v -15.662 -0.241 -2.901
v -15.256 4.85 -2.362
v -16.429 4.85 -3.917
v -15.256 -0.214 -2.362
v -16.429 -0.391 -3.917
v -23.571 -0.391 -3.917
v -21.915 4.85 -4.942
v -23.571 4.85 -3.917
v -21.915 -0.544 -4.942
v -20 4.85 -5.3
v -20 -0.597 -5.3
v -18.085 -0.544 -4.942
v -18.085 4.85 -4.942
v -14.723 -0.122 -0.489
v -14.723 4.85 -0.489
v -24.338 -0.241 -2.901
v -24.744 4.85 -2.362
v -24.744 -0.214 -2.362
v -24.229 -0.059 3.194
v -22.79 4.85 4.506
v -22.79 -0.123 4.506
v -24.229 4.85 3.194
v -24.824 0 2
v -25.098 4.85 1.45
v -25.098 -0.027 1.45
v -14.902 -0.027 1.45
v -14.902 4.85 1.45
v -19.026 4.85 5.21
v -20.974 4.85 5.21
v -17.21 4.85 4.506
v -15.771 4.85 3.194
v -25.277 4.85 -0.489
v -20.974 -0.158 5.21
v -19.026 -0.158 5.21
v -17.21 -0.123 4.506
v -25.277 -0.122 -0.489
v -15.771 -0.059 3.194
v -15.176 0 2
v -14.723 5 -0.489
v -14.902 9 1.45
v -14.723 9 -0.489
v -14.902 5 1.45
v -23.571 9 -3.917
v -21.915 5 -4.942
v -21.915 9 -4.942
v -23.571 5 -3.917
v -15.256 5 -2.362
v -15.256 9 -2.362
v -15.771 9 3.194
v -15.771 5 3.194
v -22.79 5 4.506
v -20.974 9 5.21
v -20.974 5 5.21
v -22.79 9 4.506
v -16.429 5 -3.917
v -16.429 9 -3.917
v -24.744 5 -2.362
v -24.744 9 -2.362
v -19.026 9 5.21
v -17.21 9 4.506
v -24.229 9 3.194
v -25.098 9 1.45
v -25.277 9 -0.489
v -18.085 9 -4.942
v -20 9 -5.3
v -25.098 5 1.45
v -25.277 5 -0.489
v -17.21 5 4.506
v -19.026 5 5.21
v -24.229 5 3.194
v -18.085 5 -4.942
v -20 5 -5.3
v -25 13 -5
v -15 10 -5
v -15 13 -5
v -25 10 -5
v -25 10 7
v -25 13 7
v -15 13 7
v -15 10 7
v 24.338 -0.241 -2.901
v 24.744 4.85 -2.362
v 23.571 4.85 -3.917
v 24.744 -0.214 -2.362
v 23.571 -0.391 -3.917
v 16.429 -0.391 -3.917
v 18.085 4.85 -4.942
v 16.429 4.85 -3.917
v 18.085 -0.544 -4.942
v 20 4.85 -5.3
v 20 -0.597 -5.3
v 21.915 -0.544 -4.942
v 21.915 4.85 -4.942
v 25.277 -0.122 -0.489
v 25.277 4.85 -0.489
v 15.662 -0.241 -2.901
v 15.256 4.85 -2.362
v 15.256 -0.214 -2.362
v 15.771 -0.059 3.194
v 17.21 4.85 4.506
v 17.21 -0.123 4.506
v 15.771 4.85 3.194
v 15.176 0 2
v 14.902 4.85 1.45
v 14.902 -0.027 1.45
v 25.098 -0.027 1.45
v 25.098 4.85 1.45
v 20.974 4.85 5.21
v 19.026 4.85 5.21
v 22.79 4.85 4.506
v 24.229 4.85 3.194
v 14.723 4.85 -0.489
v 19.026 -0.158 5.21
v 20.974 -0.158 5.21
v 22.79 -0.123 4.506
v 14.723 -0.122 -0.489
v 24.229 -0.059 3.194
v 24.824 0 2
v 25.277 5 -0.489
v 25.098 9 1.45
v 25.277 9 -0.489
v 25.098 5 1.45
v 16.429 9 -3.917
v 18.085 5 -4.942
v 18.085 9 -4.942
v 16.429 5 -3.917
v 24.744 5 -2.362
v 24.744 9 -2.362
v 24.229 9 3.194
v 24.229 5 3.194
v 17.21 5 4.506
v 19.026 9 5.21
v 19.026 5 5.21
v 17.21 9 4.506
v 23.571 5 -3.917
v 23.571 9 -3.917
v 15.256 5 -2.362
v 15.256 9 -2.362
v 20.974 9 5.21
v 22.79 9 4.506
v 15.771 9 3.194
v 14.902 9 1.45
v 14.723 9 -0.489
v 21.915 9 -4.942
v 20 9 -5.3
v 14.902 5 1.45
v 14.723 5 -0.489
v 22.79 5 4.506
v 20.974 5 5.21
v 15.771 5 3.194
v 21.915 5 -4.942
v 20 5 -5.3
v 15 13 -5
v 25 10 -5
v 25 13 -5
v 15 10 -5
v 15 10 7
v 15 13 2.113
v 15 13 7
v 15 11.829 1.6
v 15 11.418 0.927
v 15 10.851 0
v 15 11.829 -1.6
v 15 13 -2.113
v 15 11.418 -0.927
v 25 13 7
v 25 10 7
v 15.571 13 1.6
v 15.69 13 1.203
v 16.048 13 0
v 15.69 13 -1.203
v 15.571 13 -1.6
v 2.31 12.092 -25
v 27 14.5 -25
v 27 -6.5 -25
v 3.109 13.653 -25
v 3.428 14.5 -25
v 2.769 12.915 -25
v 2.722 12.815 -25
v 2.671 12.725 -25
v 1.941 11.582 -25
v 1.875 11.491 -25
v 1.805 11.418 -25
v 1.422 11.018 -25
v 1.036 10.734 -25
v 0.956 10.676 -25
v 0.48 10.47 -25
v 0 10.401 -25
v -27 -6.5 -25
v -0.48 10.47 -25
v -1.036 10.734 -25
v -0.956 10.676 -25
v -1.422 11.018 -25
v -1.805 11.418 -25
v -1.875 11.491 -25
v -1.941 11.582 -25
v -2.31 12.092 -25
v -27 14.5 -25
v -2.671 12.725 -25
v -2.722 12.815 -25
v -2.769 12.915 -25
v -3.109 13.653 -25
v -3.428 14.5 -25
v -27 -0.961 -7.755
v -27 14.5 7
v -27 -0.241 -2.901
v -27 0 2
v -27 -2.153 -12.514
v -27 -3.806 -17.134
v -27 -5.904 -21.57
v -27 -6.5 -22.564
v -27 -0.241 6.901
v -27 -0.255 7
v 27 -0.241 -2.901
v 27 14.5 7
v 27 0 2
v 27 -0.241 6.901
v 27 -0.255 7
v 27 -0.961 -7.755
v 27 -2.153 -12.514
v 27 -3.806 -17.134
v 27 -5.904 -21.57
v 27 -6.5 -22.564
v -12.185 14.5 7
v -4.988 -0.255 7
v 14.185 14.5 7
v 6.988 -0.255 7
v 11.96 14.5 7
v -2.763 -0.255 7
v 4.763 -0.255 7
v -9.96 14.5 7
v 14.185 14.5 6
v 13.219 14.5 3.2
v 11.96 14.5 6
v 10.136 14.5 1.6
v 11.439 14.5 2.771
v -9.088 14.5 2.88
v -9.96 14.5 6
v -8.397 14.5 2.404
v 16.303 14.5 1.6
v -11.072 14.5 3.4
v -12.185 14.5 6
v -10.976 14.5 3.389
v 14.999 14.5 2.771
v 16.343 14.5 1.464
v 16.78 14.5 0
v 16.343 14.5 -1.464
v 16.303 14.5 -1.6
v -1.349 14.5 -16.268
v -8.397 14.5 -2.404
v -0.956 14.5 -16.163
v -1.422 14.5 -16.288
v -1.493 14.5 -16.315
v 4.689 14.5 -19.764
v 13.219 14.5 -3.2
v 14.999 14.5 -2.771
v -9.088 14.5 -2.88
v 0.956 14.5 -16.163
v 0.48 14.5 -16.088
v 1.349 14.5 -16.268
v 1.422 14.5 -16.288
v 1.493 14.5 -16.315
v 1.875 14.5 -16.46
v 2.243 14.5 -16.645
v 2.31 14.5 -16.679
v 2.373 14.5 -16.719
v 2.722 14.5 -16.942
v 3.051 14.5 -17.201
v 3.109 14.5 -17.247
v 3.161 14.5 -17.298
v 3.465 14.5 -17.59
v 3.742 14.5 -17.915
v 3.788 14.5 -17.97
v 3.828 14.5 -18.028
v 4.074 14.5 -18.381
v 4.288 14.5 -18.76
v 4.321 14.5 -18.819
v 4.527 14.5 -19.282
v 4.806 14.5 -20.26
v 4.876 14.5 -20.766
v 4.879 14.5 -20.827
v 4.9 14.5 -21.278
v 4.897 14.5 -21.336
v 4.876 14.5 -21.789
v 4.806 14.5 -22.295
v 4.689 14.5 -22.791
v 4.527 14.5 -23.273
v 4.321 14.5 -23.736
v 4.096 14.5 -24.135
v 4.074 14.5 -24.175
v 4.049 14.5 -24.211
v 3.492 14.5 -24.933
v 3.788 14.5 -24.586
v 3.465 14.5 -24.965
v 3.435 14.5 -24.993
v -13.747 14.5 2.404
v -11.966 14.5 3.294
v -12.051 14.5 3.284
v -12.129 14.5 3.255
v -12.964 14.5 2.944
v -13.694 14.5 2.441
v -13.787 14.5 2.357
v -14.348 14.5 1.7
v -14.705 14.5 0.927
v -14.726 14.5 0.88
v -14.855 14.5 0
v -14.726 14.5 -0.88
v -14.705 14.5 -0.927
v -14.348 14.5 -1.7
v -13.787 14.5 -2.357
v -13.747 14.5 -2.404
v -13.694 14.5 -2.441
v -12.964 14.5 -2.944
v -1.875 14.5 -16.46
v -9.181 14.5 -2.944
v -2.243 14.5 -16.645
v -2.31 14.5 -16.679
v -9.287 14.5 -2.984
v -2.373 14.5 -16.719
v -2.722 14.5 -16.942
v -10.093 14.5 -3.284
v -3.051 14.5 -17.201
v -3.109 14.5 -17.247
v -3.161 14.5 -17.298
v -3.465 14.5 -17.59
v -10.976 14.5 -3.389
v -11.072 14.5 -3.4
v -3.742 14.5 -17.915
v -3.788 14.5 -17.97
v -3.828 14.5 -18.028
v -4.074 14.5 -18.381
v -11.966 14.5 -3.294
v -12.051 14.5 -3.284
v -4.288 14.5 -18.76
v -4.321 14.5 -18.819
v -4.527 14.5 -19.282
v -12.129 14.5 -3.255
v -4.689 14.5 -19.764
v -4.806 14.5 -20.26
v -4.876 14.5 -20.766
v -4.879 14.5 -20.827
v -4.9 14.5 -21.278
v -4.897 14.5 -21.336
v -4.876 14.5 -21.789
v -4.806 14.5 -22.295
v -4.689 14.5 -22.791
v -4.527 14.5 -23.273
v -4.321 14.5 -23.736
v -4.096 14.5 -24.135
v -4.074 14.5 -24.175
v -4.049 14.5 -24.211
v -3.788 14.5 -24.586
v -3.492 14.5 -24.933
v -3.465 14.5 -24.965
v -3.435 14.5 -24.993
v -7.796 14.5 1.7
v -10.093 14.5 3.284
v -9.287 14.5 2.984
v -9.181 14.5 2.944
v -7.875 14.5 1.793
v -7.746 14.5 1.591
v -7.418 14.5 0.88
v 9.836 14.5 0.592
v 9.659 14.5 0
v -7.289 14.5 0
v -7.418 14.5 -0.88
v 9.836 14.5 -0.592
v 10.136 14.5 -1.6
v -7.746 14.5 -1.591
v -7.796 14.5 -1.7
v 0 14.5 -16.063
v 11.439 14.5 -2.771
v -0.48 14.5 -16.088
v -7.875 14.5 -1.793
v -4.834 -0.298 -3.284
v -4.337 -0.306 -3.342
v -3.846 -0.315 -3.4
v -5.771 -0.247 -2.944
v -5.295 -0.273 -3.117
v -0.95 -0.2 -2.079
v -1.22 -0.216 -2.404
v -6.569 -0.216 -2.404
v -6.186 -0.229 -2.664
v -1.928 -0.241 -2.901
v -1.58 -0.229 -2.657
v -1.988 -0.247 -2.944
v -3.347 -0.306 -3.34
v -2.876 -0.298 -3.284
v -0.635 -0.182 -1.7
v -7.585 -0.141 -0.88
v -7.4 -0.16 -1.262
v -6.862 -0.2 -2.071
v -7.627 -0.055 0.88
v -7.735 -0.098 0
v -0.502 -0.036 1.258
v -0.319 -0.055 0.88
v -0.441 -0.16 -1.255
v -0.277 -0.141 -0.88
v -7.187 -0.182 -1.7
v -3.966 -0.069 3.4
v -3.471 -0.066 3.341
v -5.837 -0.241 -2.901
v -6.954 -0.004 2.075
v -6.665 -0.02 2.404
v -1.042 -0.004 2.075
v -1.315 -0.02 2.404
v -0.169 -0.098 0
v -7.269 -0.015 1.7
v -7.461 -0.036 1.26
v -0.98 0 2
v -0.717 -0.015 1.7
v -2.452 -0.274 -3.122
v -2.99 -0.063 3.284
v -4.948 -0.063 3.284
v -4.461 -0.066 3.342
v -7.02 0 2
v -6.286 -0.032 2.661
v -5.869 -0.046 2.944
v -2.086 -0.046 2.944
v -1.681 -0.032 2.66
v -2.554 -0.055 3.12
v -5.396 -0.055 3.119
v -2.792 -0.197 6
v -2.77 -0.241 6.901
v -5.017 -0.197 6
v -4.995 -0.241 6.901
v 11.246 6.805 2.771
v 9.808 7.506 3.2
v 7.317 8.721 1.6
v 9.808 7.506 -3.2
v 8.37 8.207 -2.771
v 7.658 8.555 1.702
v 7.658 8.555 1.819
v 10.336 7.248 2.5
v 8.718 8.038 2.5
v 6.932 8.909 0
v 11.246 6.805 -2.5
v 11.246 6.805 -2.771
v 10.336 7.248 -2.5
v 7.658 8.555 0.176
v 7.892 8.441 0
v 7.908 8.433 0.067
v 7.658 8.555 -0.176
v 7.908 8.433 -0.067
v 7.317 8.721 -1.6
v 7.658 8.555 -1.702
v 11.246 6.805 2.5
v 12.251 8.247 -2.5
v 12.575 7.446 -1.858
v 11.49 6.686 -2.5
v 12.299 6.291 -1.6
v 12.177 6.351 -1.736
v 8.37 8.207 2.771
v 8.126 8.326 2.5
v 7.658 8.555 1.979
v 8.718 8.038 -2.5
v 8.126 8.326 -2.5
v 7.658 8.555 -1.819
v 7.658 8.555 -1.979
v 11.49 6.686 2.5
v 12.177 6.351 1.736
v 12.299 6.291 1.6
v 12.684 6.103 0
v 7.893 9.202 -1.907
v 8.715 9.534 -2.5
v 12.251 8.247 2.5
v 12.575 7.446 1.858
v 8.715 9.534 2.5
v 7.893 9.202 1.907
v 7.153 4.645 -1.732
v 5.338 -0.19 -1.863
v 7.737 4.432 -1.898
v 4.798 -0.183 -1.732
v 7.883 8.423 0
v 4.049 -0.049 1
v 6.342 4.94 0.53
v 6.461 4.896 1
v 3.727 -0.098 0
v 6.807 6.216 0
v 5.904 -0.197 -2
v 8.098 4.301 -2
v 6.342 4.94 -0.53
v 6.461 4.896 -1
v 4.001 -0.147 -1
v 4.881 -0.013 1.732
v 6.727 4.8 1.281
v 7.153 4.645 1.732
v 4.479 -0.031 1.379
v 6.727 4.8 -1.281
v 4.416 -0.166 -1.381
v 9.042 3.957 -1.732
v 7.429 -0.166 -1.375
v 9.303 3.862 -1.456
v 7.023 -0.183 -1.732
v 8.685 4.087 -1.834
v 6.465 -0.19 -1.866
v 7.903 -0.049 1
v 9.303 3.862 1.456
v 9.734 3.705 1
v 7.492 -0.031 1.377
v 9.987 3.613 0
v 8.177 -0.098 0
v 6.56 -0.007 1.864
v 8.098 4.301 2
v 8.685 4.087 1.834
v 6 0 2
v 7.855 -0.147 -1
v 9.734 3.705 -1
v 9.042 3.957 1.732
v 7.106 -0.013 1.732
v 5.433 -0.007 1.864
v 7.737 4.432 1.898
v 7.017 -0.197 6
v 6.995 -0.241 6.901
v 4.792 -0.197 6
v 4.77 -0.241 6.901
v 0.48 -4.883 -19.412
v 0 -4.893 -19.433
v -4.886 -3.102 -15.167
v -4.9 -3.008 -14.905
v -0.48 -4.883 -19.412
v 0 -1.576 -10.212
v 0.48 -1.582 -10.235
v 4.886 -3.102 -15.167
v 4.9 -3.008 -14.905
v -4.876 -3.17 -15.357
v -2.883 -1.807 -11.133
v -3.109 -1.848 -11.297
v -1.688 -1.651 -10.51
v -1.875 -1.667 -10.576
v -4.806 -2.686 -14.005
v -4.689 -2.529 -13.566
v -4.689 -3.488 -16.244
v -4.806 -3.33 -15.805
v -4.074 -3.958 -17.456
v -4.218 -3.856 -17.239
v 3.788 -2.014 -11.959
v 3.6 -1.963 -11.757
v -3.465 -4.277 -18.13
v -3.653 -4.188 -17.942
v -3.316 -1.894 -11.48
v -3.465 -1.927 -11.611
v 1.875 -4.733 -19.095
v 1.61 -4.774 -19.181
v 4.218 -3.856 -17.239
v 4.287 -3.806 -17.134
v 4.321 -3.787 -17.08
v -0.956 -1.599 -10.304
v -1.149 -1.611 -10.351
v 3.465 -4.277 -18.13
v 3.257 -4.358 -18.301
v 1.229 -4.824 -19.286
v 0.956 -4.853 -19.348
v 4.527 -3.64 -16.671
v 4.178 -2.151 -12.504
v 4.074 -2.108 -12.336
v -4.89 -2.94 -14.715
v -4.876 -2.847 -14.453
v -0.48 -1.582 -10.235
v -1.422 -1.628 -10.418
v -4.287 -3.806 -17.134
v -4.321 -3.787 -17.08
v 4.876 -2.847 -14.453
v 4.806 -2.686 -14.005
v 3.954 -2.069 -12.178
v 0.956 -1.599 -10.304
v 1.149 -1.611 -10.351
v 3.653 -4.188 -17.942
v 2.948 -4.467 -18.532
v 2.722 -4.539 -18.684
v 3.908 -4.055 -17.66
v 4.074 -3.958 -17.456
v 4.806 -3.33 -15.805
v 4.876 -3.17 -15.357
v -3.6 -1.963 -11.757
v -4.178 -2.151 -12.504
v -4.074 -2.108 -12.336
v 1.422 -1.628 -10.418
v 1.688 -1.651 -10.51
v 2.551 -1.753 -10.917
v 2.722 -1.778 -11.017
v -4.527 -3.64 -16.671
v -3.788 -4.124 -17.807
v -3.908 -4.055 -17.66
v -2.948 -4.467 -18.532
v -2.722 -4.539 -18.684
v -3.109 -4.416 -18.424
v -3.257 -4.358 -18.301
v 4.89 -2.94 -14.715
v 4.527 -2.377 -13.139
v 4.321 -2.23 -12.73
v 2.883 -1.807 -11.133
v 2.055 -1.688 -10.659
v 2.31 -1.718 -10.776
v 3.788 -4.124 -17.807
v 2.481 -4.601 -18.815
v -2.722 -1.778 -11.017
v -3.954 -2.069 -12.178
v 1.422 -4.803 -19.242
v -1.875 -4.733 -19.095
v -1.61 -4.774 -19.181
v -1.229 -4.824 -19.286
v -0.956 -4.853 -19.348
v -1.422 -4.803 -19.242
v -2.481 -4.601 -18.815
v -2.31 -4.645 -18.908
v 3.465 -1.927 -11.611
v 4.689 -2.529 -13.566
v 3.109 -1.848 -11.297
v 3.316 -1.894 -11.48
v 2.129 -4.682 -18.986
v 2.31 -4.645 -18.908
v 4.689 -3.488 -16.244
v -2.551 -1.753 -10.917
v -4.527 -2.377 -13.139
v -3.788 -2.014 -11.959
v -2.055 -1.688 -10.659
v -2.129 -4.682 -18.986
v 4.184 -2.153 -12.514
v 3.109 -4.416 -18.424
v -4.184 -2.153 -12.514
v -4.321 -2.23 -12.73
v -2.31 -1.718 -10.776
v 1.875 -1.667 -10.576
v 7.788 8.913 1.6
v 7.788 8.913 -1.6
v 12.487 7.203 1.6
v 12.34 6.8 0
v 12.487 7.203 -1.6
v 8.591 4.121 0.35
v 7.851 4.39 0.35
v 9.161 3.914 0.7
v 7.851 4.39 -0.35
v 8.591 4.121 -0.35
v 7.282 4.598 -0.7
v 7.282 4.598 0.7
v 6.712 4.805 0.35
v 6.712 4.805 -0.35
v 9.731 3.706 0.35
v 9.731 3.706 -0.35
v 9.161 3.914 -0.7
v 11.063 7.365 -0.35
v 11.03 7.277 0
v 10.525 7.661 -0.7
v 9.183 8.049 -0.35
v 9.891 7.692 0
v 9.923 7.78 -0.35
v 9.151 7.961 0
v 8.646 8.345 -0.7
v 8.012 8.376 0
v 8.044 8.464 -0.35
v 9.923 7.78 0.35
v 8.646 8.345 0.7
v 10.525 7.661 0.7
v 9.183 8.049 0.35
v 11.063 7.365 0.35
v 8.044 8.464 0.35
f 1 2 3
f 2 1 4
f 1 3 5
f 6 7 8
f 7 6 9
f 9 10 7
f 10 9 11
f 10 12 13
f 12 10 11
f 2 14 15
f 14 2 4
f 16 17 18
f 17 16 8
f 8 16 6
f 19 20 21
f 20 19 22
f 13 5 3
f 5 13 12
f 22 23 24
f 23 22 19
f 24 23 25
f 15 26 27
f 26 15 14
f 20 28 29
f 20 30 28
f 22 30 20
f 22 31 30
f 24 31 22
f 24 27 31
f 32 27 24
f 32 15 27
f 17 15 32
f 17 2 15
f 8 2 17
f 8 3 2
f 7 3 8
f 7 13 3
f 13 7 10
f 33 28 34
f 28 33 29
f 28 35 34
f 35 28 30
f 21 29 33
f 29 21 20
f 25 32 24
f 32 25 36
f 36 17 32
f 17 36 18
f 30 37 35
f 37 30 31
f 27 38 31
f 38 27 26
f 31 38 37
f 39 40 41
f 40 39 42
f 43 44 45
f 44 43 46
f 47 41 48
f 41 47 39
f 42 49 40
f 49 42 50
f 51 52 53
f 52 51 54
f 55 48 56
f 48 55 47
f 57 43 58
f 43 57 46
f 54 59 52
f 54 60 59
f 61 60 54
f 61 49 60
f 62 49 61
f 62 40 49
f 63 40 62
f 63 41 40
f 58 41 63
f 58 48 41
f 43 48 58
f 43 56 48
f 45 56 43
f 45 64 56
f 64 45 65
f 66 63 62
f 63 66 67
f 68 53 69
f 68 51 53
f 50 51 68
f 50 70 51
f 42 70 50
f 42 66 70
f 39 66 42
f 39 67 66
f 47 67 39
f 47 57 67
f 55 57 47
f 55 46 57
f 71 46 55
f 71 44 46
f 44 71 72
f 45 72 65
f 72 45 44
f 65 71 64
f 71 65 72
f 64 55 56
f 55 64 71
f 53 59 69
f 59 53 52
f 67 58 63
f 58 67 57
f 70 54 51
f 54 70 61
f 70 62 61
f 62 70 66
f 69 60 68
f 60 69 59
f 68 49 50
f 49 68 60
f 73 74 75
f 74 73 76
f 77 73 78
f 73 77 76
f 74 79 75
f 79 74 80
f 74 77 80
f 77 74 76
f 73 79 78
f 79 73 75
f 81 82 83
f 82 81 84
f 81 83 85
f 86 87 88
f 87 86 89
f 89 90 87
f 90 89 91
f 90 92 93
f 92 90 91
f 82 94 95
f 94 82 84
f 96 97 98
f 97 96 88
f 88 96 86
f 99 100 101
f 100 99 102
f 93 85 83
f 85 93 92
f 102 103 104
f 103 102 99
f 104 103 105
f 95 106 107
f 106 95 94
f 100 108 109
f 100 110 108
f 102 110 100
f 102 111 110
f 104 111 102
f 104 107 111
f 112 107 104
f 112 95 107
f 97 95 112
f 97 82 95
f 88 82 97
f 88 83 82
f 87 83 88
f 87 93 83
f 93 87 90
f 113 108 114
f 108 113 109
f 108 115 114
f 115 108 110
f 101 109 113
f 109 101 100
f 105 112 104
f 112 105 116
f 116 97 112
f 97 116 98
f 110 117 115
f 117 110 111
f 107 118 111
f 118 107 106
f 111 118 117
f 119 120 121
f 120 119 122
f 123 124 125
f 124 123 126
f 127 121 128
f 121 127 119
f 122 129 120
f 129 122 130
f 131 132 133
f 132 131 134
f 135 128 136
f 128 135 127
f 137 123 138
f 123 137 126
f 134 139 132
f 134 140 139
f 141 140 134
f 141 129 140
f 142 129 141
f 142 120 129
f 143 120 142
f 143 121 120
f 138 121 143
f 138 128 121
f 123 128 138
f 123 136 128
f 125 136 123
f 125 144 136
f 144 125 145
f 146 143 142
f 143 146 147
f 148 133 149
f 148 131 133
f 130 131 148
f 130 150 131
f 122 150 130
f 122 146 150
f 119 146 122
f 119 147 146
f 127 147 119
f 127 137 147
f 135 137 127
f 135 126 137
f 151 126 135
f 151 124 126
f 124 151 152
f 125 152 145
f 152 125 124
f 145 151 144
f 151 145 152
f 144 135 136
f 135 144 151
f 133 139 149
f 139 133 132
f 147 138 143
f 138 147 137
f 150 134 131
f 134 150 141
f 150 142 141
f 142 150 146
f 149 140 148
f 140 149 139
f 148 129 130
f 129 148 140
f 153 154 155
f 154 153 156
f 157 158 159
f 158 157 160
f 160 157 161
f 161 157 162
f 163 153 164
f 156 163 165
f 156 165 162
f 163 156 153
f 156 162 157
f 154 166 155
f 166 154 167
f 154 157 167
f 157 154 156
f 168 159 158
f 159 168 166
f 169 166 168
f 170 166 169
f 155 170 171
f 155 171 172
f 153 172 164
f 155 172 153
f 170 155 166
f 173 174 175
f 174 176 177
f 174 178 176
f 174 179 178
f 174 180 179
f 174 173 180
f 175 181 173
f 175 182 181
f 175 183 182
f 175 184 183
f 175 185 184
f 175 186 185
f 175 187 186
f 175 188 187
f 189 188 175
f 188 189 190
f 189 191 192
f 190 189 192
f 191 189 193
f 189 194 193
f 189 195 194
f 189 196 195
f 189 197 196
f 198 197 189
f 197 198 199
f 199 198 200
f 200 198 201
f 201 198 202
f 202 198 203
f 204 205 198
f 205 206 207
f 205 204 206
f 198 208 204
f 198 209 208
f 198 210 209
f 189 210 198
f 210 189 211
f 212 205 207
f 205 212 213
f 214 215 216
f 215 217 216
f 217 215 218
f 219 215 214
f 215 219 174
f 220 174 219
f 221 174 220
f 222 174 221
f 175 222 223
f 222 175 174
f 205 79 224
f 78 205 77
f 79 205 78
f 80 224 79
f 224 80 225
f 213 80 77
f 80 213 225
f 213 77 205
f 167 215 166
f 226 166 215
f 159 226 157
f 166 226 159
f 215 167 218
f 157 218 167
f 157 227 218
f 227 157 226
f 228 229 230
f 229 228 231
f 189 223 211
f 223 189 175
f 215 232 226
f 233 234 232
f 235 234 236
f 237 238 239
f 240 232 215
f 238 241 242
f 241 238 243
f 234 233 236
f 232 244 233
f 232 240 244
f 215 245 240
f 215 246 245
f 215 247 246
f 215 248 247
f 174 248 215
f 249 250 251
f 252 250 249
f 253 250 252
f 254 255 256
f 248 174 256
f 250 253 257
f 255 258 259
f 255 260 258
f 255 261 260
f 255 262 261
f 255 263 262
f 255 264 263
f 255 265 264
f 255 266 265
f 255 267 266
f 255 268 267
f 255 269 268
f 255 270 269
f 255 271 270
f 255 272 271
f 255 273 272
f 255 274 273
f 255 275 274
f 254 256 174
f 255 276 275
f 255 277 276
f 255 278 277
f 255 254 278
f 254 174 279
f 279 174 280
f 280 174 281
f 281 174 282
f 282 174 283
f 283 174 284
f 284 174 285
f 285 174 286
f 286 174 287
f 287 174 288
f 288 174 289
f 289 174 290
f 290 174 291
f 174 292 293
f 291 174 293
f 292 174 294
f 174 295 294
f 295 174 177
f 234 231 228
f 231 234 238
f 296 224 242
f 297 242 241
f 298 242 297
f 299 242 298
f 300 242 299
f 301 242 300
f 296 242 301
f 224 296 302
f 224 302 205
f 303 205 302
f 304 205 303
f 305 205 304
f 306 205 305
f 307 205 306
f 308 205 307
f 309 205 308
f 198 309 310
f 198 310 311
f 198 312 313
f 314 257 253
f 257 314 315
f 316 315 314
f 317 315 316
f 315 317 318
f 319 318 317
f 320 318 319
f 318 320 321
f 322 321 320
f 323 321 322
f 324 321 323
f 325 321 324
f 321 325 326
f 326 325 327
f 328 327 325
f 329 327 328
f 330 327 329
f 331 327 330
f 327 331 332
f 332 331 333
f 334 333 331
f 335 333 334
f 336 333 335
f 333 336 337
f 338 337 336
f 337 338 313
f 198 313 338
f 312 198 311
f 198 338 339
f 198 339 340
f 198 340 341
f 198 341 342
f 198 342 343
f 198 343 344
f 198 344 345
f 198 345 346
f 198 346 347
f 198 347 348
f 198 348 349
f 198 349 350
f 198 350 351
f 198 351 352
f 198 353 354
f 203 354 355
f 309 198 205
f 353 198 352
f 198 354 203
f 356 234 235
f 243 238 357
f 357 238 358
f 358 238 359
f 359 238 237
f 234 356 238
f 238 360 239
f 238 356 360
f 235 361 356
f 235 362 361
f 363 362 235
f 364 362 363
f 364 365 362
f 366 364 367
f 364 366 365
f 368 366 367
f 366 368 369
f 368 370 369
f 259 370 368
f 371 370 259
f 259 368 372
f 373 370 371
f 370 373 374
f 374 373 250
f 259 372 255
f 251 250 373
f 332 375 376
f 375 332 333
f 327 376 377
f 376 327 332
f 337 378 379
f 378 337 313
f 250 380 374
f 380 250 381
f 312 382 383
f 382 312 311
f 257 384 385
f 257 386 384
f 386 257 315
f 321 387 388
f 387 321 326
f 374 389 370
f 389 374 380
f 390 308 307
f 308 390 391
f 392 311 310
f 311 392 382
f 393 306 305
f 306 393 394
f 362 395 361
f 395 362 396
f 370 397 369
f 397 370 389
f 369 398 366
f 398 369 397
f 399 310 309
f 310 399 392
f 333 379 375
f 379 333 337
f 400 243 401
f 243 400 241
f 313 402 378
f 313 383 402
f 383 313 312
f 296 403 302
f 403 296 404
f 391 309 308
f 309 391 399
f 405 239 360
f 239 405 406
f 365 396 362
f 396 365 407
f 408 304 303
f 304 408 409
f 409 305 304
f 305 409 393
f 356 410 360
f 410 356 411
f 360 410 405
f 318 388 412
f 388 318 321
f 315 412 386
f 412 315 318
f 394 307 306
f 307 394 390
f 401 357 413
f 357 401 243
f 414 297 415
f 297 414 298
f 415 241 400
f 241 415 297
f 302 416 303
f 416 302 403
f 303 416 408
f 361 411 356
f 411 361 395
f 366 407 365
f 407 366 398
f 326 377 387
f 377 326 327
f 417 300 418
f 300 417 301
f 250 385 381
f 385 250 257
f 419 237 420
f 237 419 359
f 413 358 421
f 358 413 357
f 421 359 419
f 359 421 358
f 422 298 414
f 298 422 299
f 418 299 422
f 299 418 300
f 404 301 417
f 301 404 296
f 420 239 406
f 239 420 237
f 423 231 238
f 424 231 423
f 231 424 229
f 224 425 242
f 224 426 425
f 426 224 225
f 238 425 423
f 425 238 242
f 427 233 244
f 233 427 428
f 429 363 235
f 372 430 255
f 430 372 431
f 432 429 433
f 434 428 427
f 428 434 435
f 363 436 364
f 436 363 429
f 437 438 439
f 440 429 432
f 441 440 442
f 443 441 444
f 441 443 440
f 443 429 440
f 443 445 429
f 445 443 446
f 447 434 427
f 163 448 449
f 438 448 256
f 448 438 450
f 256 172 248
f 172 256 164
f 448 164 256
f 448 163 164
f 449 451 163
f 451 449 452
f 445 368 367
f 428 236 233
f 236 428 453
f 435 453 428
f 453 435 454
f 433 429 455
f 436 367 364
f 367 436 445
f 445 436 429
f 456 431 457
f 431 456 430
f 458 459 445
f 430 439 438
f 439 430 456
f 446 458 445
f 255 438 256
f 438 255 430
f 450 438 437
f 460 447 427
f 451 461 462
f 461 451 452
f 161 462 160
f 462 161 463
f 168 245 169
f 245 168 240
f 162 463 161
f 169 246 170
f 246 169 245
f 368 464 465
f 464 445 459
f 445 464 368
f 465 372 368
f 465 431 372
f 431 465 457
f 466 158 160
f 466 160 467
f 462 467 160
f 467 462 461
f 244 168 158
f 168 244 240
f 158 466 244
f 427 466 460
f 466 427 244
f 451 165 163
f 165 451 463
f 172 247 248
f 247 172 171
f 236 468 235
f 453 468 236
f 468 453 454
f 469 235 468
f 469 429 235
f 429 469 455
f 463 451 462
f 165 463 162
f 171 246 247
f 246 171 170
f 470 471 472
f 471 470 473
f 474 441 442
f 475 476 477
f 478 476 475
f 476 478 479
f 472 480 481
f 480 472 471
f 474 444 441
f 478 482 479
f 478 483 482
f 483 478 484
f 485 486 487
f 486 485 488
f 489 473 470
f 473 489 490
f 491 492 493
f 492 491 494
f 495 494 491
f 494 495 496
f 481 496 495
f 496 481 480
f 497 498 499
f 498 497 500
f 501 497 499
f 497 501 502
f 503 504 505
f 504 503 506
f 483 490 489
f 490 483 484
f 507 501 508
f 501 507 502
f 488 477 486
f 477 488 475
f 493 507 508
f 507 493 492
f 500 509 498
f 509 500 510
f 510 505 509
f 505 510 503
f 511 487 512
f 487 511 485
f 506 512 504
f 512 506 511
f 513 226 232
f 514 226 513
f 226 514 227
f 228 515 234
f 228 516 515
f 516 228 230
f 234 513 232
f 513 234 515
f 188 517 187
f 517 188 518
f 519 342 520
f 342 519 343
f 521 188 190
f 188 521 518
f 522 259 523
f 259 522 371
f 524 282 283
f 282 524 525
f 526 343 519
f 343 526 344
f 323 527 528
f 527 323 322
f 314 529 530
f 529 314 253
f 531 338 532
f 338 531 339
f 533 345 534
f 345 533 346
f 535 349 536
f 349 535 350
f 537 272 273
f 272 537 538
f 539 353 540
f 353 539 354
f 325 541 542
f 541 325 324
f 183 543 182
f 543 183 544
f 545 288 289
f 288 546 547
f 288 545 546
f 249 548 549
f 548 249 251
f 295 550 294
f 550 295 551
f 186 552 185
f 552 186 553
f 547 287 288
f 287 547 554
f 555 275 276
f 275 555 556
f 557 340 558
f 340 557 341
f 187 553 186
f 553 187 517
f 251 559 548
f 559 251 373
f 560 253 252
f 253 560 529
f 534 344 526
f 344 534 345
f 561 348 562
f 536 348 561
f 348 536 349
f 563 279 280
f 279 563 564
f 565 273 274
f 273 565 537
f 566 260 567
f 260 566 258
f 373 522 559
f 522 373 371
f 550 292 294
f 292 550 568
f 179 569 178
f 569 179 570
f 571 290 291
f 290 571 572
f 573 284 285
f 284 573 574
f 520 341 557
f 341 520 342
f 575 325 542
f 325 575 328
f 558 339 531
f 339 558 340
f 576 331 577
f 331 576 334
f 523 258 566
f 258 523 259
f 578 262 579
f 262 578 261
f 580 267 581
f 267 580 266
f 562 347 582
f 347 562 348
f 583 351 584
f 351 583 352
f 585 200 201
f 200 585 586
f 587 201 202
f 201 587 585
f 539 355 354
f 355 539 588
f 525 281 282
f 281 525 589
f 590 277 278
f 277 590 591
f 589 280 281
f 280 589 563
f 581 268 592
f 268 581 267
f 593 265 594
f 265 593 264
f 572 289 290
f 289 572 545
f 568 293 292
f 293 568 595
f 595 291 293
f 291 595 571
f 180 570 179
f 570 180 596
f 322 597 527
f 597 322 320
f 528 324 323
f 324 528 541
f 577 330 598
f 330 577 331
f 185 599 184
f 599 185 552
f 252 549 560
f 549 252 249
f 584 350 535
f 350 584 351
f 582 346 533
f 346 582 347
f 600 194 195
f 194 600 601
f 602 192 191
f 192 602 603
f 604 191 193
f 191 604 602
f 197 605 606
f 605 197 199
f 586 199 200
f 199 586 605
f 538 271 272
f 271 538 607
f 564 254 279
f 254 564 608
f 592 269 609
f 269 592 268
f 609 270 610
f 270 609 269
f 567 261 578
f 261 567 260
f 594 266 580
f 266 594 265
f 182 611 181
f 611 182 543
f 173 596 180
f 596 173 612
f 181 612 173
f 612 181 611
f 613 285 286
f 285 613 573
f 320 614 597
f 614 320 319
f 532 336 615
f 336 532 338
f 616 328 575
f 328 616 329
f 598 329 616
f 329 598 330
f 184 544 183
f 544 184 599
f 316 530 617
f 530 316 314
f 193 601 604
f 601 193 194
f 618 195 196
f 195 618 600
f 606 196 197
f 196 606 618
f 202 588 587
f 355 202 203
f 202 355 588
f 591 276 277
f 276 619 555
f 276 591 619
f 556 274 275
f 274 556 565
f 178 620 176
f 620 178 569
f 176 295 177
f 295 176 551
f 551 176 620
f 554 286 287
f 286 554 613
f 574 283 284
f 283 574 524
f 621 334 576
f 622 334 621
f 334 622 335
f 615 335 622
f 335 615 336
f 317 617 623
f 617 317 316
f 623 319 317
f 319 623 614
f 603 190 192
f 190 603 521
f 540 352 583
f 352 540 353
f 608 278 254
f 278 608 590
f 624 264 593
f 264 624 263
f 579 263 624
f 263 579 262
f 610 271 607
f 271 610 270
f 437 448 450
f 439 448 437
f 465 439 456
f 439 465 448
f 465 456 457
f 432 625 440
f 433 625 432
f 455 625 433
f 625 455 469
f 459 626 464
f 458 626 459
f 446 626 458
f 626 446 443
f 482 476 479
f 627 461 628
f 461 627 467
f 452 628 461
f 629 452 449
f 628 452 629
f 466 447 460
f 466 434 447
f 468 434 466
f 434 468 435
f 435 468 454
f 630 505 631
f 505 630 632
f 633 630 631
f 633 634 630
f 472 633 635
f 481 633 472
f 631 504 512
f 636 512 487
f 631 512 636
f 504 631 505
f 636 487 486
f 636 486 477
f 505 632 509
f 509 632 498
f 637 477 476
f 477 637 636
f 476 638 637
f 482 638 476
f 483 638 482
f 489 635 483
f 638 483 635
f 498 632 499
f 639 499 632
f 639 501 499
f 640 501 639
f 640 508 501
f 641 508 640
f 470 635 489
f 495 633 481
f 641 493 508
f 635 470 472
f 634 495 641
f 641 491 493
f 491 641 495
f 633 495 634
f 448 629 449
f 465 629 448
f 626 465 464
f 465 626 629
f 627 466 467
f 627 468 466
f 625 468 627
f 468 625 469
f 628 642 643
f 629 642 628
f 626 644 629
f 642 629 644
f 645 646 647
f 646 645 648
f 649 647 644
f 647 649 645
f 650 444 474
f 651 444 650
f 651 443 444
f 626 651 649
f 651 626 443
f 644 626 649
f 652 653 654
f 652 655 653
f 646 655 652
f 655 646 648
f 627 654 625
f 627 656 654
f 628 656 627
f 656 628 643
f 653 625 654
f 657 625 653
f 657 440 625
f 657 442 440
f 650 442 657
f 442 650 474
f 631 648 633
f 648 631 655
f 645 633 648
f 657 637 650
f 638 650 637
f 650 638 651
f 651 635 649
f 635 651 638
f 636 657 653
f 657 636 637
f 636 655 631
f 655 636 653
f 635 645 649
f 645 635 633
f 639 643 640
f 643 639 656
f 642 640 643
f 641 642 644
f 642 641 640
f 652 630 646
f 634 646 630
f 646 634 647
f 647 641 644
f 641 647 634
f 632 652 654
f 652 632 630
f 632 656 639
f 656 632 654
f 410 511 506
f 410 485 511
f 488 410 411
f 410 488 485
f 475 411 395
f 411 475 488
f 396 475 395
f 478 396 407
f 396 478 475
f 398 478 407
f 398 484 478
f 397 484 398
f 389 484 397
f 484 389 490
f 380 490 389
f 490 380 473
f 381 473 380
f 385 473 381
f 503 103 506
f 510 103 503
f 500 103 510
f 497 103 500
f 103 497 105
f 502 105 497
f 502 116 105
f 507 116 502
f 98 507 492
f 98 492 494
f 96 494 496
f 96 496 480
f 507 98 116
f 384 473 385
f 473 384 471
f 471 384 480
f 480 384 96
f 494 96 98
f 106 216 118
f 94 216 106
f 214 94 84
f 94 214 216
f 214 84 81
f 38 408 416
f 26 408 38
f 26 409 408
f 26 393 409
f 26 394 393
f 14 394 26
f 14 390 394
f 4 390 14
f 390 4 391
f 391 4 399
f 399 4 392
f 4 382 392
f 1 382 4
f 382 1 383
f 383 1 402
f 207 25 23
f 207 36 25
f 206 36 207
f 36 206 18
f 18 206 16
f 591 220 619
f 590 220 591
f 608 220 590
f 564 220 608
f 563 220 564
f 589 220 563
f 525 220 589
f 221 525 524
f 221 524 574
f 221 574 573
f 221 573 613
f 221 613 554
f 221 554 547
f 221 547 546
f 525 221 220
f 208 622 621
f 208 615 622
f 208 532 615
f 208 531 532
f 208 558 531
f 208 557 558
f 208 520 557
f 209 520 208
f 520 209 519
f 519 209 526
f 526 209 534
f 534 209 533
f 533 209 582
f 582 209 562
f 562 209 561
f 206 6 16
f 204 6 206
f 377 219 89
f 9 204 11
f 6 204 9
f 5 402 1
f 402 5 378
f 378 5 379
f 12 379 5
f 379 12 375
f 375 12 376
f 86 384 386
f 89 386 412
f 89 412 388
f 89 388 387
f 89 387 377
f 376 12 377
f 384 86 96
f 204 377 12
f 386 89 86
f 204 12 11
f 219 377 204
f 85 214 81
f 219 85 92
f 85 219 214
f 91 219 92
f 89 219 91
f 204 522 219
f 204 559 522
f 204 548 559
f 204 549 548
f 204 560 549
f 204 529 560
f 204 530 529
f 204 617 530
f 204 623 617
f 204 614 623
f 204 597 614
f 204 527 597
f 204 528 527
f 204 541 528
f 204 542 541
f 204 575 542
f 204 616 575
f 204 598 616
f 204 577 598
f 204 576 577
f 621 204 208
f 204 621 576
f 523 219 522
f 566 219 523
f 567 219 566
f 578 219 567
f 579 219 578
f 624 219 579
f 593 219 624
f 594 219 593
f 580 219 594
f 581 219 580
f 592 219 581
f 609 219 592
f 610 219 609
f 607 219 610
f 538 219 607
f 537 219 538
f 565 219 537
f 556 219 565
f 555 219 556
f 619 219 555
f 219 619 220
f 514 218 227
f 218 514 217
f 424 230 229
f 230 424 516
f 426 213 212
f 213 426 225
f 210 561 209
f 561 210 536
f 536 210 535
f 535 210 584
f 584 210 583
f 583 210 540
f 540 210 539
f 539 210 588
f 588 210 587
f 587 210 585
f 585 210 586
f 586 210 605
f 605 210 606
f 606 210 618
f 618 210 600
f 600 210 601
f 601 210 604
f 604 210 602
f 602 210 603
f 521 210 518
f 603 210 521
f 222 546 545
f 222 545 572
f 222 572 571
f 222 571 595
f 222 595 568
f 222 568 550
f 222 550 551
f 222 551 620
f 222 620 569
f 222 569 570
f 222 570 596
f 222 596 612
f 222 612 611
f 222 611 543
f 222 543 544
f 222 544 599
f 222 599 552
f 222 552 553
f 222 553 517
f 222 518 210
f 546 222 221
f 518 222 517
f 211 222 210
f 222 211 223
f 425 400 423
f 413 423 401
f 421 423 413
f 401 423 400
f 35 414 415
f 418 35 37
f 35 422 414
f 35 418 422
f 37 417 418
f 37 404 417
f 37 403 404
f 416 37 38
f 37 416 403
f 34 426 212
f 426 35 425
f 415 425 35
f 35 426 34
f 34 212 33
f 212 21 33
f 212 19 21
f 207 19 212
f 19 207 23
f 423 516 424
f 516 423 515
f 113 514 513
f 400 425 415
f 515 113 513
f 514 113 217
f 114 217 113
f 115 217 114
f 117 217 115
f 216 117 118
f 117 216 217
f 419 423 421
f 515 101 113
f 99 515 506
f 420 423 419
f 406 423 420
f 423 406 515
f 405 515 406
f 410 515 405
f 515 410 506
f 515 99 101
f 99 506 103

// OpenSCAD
diameter=10;
height=4;
number=3;
distance=5;
baseline=36; 


module maghole(diameter,height,number,back) {
		translate([0,height*(number-2)/2,0])
        rotate([90,0,0])
         cylinder(r=diameter/2,h=height*(2*number-1),center=true);
    if(back == 1) {
		translate([0,-height*2*(number+1)/2,0])
        rotate([90,0,0])
         cylinder(r=diameter/6,h=height*number,center=true);
    }
}

module smaghole(diameter,height,number,back) {
		translate([0,.15+height*(number-2)/2,0])
        rotate([90,0,0])
         cylinder(r=0.3+diameter/2,h=height*3.5,center=true);
//         cylinder(r=0.3+diameter/2,h=height*(2*number-1),center=true);
    if(back == 1) {
		translate([0,-7,0])
        rotate([90,0,0])
         cylinder(r=0.3+diameter/2,h=height,center=true);
    }
    translate([-9,-13,-5]) cube([4+diameter,3,diameter]);    
   // translate([-1,-15,0]) cube([3,3,10]);
}
module mirror(diameter,height,number,distance,baseline) {
width=diameter+4;
depth=distance+height*number+4;
length=baseline+diameter+8;
mirrorthick = 2.7;
   difference() {
     translate([0,-height,0])
	   cube([width,  // Small dimension
            depth, // Optical path dim
		      length],center=true);
      translate([0,0,2+baseline/2])
             maghole(diameter,height,number,0);
     translate([0,0,-(2+baseline/2)])
             maghole(diameter,height,number,0);
     translate([0,depth/4,0])
          cube([width+2,depth+2,length-2*width],center=true);
    rotate([7,0,0])
     translate([0,0.6-depth/3,0.75])
          cube([width+2,mirrorthick+0.6,length-(2*diameter+4)],center=true);
     }
}

module sensor(diameter,height,number,distance,baseline) {
width=diameter+4;
depth=distance+height*number+4;
length=baseline+diameter+8;
mirrorthick = 2.6;
extra=2*width+4;

   difference() {
     translate([2+width/2,-height,0])
	   cube([extra,  // Small dimension
            depth, // Optical path dim
		      length],center=true);
      translate([0,0,2+baseline/2])
             smaghole(diameter,height,number,1);
     translate([0,0,-(2+baseline/2)])
             smaghole(diameter,height,number,1);
//LASER
     translate([0,0,4])
        rotate([64,0,0])
             cylinder(r=3.4,h=40,center=true,$fn=24);
     translate([-11,0,4])
        rotate([64,0,0]) cube([10,2,40],center=true);
//PhotoTransistor
     translate([0,-12,-12])
        rotate([116,0,0])
             cylinder(r=3.2,h=10,center=true,$fn=12);
     translate([0,0,-6])
        rotate([116,0,0])
             cylinder(r=2,h=40,center=true,$fn=12);
     translate([-11,0,-6])
        rotate([116,0,0]) cube([10,2,40],center=true);
//TEMP SENSOR
     translate([2+width,0,0])
        rotate([90,0,20])
             cylinder(r=4.9,h=40,center=true,$fn=64);

     }
translate([0,-4,-6])
rotate([20,0,0])
     difference() {
     translate([0,-4,-2.5])cube([5,6,5],center=true);
     translate([0,-8,0])
        cylinder(r=3.2,h=10,center=true,$fn=12);
     translate([0,0,-1.0])
        rotate([90,0,0])
             cylinder(r=0.7,h=40,center=true,$fn=6);
     translate([0,0,-3])
        rotate([90,0,0])
             cylinder(r=0.7,h=40,center=true,$fn=6);
     }
}

module jarwall() {
  difference() {
     cube([40,40,120],center=true);
	  translate([40,0,0])
	     cylinder(r=50,h=120,center=true,$fn=64);
	   }
}

module jar() {
	  translate([-8,110,-10])
	          cylinder(r=50,h=120,center=true,$fn=64);
}

module powerhole(dim) {
offset = dim+2;
  //  cylinder(r=dim,h=2*dim,center=true,$fn=10);
  //  translate([dim-1.6,0,0])
   //   cylinder(r=dim,h=dim,center=true,$fn=10);
    translate([dim-3,0,0]) cube([2*dim+2,2*dim-1,2*dim-1],center=true);
    translate([-offset,0,0])
      cylinder(r=1.1,h=2*dim,center=true,$fn=10);
    translate([offset+2,0,0])
      cylinder(r=1.1,h=2*dim,center=true,$fn=10);
}

module sensordevice() {
  wall = 32;
  side = 44;
  deep = 50;
  difference() { 
   sensor(diameter,height,number,distance,baseline);
   translate([6,-60,3]) jar();
  }
//  translate([-7,-(wall+30),21]) cube([wall,side+12,3]);

//     translate([-7,-(wall+30),-24])
//         cube([wall,side+12,3]);

//  difference() {
//  translate([23.5,-(wall+7),0])
//    rotate([0,90,0])
//    cube([side,deep,3],center=true);
//     translate([24,-54,12])
//			rotate([0,90,0]) 
//           powerhole(4.5);
//  }
}
module mirrordevice() {
  difference() { 
   mirror(diameter,height,number,distance,baseline);
   translate([0,-3.3,0]) rotate([0,0,-90]) jarwall();
  }
}

rotate([0,90,180]) 
   sensordevice();
  // mirrordevice();



     
